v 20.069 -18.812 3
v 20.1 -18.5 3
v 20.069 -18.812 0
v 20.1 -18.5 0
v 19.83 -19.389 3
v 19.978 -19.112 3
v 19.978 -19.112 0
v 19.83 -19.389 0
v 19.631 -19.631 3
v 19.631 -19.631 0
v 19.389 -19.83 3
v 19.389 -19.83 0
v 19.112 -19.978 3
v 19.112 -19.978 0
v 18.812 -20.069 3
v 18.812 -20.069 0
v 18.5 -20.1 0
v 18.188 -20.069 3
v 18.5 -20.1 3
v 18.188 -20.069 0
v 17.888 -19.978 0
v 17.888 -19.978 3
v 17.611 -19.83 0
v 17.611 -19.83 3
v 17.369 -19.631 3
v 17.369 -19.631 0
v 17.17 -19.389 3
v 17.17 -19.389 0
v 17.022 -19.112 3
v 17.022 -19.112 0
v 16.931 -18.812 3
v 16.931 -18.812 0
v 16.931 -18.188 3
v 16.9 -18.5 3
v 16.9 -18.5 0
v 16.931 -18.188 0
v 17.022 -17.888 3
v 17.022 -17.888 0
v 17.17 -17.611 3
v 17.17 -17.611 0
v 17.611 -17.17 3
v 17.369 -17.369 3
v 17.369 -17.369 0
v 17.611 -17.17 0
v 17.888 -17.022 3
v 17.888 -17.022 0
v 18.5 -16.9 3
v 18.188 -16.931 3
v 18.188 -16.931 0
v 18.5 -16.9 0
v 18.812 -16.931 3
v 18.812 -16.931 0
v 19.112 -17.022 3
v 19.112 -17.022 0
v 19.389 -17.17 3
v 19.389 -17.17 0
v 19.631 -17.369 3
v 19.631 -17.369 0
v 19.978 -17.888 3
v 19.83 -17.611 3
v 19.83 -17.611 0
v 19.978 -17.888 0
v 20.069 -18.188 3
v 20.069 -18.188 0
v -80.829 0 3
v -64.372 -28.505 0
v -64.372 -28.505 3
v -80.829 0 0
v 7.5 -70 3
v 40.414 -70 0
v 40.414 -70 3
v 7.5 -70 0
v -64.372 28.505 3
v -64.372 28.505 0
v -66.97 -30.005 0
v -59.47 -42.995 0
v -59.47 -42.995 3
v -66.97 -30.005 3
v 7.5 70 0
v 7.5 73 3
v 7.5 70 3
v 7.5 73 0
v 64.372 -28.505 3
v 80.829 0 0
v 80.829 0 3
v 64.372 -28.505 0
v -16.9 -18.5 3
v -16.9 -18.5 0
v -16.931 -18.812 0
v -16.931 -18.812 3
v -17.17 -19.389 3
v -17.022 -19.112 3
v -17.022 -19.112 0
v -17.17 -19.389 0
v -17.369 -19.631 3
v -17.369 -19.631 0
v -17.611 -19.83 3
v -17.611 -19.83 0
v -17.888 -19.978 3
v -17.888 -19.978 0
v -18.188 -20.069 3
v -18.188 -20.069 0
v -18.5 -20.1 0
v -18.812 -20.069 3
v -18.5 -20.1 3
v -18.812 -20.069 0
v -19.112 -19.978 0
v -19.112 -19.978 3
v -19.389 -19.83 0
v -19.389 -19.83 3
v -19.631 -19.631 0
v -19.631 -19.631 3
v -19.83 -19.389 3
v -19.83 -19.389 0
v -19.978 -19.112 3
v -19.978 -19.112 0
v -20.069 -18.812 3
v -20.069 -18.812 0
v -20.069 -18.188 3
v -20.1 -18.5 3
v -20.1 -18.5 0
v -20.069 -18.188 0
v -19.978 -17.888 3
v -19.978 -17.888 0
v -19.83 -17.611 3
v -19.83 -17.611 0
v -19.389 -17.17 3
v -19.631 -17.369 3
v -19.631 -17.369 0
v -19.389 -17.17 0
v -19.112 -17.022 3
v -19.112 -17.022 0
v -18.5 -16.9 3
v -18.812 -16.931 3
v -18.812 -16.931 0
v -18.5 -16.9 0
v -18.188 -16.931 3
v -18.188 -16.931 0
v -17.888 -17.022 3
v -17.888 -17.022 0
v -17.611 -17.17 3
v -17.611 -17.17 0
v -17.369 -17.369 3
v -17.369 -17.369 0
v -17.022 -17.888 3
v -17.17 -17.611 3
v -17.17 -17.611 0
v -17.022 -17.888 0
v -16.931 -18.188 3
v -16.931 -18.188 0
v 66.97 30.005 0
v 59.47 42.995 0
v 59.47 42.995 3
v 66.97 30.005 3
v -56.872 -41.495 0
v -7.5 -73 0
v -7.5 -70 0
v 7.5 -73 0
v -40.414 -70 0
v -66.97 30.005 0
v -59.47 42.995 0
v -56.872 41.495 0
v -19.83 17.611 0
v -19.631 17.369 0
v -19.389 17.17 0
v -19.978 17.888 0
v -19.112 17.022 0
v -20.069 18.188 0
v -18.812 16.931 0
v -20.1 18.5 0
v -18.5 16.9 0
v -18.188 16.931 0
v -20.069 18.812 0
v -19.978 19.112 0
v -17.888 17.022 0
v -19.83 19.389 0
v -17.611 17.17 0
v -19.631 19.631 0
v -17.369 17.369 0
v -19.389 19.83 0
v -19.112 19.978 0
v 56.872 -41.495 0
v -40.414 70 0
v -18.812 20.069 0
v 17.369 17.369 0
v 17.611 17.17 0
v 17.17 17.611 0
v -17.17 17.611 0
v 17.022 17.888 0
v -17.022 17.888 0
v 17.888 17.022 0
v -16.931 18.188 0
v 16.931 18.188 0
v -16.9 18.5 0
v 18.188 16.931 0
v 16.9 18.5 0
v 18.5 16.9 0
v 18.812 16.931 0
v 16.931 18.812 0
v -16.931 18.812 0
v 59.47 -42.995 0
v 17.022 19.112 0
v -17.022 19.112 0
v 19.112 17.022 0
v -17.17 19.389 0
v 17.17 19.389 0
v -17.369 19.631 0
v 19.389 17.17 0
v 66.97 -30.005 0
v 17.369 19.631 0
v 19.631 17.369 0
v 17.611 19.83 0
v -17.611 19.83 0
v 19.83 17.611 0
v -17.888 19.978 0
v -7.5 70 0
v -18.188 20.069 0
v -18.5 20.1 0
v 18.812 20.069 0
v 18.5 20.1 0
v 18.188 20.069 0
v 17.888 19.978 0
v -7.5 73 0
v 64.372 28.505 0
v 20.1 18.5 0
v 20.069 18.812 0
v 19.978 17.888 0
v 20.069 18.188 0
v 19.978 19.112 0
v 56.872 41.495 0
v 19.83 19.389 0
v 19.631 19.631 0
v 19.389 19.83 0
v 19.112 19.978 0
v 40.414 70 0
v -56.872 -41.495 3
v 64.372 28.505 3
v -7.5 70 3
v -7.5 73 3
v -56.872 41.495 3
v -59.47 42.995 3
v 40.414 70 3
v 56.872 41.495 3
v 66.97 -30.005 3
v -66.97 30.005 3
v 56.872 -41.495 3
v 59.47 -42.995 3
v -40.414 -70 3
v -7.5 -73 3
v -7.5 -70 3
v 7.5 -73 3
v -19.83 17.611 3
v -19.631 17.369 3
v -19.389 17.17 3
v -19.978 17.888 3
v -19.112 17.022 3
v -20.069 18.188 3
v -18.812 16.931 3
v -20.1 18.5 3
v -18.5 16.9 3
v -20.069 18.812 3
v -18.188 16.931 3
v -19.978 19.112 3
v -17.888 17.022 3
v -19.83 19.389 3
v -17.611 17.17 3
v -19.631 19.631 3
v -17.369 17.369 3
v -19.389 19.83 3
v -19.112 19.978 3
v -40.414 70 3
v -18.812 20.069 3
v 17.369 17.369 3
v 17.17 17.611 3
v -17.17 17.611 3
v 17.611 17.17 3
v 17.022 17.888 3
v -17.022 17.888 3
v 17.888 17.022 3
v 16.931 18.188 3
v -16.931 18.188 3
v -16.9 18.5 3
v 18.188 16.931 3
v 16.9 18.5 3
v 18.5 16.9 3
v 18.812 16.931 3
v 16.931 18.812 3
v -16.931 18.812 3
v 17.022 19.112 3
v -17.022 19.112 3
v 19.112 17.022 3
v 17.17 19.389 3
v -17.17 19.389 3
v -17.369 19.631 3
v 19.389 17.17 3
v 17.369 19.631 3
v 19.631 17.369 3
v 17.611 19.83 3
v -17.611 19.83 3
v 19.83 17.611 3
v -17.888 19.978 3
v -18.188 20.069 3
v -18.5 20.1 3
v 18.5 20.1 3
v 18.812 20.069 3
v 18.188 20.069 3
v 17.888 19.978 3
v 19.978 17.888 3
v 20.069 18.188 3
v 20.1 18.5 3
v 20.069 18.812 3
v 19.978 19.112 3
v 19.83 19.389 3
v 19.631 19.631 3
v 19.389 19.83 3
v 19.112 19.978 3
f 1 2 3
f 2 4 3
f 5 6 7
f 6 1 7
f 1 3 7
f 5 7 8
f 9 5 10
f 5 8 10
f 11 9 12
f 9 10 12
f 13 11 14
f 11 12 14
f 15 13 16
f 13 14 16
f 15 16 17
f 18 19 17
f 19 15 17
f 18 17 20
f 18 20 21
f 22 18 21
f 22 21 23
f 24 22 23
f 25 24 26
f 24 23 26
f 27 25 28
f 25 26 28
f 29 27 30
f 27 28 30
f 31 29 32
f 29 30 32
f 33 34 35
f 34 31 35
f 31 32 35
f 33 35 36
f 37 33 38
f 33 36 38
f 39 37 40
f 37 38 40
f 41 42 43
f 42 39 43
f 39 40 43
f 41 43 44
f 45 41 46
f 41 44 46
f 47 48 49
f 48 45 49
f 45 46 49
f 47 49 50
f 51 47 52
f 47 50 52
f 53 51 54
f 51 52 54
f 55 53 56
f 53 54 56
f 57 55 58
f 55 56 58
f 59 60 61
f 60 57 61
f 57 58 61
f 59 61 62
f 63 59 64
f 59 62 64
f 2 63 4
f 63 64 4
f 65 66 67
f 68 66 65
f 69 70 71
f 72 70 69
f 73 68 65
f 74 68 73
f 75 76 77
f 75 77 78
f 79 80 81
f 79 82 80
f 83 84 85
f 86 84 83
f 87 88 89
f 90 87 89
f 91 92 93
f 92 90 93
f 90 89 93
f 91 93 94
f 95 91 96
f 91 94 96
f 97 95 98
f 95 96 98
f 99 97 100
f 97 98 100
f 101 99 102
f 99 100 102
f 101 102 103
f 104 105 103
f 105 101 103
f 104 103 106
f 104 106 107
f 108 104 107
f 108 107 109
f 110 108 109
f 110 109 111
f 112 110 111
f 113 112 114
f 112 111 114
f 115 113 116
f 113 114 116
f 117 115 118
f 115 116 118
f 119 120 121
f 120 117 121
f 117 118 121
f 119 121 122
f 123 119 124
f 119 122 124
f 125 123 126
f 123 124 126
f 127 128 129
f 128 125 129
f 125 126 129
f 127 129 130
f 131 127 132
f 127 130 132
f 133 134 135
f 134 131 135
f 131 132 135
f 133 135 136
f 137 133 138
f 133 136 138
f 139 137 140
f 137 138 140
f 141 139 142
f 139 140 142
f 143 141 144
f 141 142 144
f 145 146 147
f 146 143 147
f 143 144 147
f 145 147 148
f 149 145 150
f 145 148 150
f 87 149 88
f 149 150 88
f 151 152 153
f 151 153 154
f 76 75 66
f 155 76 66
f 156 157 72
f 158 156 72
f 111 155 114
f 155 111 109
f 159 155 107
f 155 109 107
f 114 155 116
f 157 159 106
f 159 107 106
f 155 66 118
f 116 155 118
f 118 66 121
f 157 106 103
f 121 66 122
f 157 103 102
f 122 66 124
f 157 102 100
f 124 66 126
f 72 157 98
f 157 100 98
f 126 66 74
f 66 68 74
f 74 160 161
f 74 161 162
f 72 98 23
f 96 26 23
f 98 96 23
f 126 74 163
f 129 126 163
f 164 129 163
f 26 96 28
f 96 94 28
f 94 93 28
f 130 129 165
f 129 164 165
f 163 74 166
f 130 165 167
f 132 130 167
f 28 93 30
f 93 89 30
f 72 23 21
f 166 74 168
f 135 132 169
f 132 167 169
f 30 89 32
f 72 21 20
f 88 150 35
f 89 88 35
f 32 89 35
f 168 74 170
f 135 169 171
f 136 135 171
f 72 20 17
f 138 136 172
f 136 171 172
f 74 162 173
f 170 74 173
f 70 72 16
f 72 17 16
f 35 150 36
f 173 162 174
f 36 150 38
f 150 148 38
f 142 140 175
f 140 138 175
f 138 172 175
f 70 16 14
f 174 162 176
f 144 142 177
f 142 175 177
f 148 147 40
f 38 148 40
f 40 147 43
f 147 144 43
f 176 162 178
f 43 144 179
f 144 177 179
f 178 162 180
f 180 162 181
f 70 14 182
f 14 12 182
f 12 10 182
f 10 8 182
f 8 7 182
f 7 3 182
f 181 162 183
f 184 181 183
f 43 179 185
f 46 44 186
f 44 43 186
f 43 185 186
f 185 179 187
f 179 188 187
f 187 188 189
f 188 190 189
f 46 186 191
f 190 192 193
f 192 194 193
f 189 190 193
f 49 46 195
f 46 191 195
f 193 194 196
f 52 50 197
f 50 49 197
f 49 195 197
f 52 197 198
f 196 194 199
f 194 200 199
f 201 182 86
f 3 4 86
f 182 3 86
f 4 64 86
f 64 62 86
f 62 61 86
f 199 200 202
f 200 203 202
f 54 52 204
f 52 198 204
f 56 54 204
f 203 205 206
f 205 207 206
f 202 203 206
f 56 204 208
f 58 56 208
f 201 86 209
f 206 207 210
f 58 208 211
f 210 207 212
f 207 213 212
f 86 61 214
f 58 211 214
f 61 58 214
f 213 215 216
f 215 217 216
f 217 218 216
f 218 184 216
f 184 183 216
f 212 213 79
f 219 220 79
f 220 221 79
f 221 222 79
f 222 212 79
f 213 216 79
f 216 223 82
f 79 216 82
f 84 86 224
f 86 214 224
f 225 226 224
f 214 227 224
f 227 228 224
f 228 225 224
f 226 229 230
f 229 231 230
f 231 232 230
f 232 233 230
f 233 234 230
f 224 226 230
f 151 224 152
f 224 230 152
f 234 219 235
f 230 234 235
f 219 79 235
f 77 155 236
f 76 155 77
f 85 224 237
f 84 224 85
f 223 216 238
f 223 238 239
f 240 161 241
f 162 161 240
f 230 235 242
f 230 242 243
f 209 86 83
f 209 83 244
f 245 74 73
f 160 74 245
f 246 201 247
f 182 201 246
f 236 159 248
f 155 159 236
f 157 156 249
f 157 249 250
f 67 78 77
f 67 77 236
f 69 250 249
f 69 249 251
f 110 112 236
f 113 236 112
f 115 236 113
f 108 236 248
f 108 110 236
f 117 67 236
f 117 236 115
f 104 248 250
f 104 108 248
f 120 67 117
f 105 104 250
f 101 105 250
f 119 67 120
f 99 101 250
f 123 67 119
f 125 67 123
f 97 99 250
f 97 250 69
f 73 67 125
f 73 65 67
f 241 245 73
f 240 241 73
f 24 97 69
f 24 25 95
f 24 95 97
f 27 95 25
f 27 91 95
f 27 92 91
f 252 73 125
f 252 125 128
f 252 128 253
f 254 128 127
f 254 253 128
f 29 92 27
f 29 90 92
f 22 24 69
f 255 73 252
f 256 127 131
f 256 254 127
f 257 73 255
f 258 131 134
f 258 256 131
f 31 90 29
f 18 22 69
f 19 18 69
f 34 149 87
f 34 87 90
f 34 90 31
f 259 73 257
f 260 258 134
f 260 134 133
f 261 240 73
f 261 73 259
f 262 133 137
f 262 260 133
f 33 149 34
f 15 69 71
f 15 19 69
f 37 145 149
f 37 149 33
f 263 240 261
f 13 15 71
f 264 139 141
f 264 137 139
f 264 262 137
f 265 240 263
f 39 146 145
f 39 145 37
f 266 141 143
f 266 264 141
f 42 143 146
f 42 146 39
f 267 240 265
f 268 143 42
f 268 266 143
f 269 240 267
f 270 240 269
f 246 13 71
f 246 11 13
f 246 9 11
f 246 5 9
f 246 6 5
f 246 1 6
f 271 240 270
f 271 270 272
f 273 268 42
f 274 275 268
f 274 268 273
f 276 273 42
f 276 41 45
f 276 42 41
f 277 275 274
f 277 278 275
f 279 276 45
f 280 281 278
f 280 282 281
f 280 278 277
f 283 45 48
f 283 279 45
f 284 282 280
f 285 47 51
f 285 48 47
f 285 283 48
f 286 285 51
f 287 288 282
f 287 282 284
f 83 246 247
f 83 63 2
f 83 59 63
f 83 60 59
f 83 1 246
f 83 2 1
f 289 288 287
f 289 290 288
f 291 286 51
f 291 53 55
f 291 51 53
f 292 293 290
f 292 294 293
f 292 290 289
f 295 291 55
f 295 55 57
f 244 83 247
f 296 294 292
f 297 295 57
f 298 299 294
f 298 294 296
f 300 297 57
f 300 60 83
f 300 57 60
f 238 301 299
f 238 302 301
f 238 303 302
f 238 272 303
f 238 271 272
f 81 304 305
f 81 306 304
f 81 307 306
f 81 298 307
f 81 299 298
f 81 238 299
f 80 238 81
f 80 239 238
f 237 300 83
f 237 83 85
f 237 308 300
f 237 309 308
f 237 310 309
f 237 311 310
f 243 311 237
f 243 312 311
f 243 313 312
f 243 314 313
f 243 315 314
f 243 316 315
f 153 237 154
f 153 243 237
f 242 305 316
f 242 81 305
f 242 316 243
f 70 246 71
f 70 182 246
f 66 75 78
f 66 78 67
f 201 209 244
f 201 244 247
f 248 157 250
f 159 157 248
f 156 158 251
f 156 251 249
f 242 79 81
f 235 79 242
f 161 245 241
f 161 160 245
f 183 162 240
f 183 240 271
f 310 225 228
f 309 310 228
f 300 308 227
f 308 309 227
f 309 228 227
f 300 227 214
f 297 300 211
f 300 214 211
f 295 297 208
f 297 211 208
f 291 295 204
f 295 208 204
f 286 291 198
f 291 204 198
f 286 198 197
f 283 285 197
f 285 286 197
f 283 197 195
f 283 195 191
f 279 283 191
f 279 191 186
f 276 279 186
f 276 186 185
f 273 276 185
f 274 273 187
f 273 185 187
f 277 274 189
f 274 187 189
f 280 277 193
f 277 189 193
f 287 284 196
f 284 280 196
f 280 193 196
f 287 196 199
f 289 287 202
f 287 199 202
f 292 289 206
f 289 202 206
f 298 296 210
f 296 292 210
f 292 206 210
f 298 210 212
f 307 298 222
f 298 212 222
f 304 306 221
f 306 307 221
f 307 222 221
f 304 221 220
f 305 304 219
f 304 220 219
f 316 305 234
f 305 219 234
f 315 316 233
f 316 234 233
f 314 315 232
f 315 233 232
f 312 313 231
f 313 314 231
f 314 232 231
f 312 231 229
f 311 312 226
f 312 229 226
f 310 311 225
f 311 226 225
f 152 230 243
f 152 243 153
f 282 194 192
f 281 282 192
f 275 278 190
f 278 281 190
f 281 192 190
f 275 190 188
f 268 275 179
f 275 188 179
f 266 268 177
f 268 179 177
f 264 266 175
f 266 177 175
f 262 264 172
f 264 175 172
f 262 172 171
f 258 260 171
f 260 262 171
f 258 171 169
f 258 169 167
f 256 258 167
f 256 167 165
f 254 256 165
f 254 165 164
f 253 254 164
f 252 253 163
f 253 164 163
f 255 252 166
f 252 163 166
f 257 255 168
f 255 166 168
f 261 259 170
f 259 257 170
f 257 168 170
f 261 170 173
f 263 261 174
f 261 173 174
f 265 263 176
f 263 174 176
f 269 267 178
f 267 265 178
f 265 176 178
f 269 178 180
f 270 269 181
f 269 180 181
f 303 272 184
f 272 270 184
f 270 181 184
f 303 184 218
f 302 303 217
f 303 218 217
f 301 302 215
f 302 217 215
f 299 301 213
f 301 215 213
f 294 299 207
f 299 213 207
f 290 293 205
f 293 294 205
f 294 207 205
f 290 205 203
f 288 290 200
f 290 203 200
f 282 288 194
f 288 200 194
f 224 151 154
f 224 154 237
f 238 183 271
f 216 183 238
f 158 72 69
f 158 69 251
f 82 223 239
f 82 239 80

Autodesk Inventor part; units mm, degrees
ref_plane "YZ Plane" through (0, 0, 0) normal (1, 0, 0) x (0, 1, 0)
ref_plane "XZ Plane" through (0, 0, 0) normal (0, 1, 0) x (-1, 0, 0)
ref_plane "XY Plane" through (0, 0, 0) normal (0, 0, 1) x (1, 0, 0)
sketch "Sketch1" plane through (0, 0, 0) normal (0, 0, 1) x (1, 0, 0)
  line L0 (-7.5, 73) -> (7.5, 73)
  line L1 (7.5, 73) -> (7.5, 70)
  line L2 (-7.5, 70) -> (-7.5, 73)
  line L3 (-40.4145, 70) -> (-7.5, 70)
  line L4 (7.5, 70) -> (40.4145, 70)
  line L5 (-66.9699, 30.0048) -> (-59.4699, 42.9952)
  line L6 (-59.4699, 42.9952) -> (-56.8718, 41.4952)
  line L7 (-64.3718, 28.5048) -> (-66.9699, 30.0048)
  line L8 (-59.4699, -42.9952) -> (-66.9699, -30.0048)
  line L9 (-66.9699, -30.0048) -> (-64.3718, -28.5048)
  line L10 (-56.8718, -41.4952) -> (-59.4699, -42.9952)
  line L11 (7.5, -73) -> (-7.5, -73)
  line L12 (-7.5, -73) -> (-7.5, -70)
  line L13 (7.5, -70) -> (7.5, -73)
  line L14 (66.9699, -30.0048) -> (59.4699, -42.9952)
  line L15 (59.4699, -42.9952) -> (56.8718, -41.4952)
  line L16 (64.3718, -28.5048) -> (66.9699, -30.0048)
  line L17 (59.4699, 42.9952) -> (66.9699, 30.0048)
  line L18 (66.9699, 30.0048) -> (64.3718, 28.5048)
  line L19 (56.8718, 41.4952) -> (59.4699, 42.9952)
  line L20 (-80.829, 0) -> (-64.3718, 28.5048)
  line L21 (-56.8718, 41.4952) -> (-40.4145, 70)
  line L22 (40.4145, 70) -> (56.8718, 41.4952)
  line L23 (64.3718, 28.5048) -> (80.829, 0)
  line L24 (80.829, 0) -> (64.3718, -28.5048)
  line L25 (56.8718, -41.4952) -> (40.4145, -70)
  line L26 (40.4145, -70) -> (7.5, -70)
  line L27 (-7.5, -70) -> (-40.4145, -70)
  line L28 (-40.4145, -70) -> (-56.8718, -41.4952)
  line L29 (-64.3718, -28.5048) -> (-80.829, 0)
  circle A0 centre (-18.5, 18.5) radius 1.6
  circle A1 centre (18.5, 18.5) radius 1.6
  circle A2 centre (18.5, -18.5) radius 1.6
  circle A3 centre (-18.5, -18.5) radius 1.6
  point P0 (0, 0)
  point P1 (0, 0)
  point P2 (0, 73)
  point P3 (-63.2199, 36.5)
  point P4 (-63.2199, -36.5)
  point P5 (0, -73)
  point P6 (63.2199, -36.5)
  point P7 (63.2199, 36.5)
  dimension "d1" = 3
  dimension "d3" = 15
  dimension "d6" = 360
  dimension "d8" = 140
  dimension "d9" = 146
  dimension "d12" = 3.2
  dimension "d13" = 3.2
  dimension "d14" = 3.2
  dimension "d15" = 3.2
  dimension "d16" = 37
  dimension "d17" = 37
  dimension "d18" = 18.5
  dimension "d19" = 18.5
extrude "Extrusion2" add sketch "Sketch1" along normal blind 3
